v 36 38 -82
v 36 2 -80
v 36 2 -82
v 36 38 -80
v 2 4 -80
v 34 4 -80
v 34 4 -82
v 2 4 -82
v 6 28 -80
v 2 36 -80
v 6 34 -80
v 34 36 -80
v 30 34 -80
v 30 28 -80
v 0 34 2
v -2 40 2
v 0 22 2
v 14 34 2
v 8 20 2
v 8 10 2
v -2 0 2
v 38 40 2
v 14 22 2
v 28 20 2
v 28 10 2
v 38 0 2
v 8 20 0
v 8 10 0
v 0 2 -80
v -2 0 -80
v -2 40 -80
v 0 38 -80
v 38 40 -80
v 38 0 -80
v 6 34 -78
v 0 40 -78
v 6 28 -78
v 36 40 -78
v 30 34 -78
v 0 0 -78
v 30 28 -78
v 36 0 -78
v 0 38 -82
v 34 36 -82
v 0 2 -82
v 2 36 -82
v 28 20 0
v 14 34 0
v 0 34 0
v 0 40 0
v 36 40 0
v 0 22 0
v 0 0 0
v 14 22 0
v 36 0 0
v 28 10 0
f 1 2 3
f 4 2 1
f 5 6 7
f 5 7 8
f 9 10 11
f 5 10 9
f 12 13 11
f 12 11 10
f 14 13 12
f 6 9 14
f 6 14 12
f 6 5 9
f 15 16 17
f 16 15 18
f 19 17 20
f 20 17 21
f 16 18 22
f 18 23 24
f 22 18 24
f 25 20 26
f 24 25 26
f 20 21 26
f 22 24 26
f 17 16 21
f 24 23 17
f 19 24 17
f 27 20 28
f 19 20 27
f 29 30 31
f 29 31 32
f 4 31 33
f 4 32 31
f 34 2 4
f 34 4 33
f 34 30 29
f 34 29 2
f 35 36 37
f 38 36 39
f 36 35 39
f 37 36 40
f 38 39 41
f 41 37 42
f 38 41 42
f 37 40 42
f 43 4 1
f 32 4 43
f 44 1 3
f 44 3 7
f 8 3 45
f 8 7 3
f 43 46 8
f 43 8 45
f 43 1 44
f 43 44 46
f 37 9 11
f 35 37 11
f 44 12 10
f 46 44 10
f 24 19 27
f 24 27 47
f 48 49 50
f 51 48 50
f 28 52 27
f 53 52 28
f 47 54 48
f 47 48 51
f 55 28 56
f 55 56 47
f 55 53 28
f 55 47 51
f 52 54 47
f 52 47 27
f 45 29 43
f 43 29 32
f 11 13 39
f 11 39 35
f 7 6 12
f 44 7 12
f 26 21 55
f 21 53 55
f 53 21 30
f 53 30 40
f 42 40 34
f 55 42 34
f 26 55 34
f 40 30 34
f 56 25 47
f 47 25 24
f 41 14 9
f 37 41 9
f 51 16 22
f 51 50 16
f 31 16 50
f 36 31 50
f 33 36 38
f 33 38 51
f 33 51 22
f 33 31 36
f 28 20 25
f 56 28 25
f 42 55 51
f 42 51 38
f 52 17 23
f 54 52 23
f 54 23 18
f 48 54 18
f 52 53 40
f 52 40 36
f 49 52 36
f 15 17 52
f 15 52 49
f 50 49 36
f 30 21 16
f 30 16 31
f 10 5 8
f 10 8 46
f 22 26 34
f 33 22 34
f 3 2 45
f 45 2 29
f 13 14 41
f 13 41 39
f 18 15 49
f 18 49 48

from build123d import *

# Parameters (mm, degrees)
SKETCH1_W           = 40
SKETCH1_H           = 82
SKETCH1_W_2         = 36
SKETCH1_H_2         = 78
BOSS_EXTRUDE1_DEPTH = 40
SKETCH2_W           = 20
SKETCH2_H           = 10
SKETCH2_W_2         = 14
SKETCH2_H_2         = 12
CUT_EXTRUDE1_DEPTH  = 20
SKETCH4_W           = 36
SKETCH4_H           = 36
SKETCH4_W_2         = 32
SKETCH4_H_2         = 32
BOSS_EXTRUDE2_DEPTH = 2
SKETCH3_W           = 24
SKETCH3_H           = 6
CUT_EXTRUDE2_DEPTH  = 2


with BuildPart() as part:
    # Sketch1 → Boss-Extrude1 (new body)
    with BuildSketch(Plane(origin=(0, 0, 0), x_dir=(1, 0, 0), z_dir=(0, 1, 0))):
        with Locations((18, 39)):
            Rectangle(SKETCH1_W, SKETCH1_H)
        with Locations((18, 39)):
            Rectangle(SKETCH1_W_2, SKETCH1_H_2, mode=Mode.SUBTRACT)
    extrude(amount=BOSS_EXTRUDE1_DEPTH)

    # Sketch2 → Cut-Extrude1 (cut)
    with BuildSketch(Plane.XY.offset(2)):
        with Locations((18, 15)):
            Rectangle(SKETCH2_W, SKETCH2_H)
        with Locations((7, 28)):
            Rectangle(SKETCH2_W_2, SKETCH2_H_2)
    extrude(amount=-CUT_EXTRUDE1_DEPTH, mode=Mode.SUBTRACT)

    # Sketch4 → Boss-Extrude2 (add)
    with BuildSketch(Plane(origin=(0, 0, -80), x_dir=(-1, 0, 0), z_dir=(0, 0, -1))):
        with Locations((-18, 20)):
            Rectangle(SKETCH4_W, SKETCH4_H)
        with Locations((-18, 20)):
            Rectangle(SKETCH4_W_2, SKETCH4_H_2, mode=Mode.SUBTRACT)
    extrude(amount=BOSS_EXTRUDE2_DEPTH)

    # Sketch3 → Cut-Extrude2 (cut)
    with BuildSketch(Plane(origin=(0, 0, -80), x_dir=(-1, 0, 0), z_dir=(0, 0, -1))):
        with Locations((-18, 31)):
            Rectangle(SKETCH3_W, SKETCH3_H)
    extrude(amount=-CUT_EXTRUDE2_DEPTH, mode=Mode.SUBTRACT)


solid = part.part
